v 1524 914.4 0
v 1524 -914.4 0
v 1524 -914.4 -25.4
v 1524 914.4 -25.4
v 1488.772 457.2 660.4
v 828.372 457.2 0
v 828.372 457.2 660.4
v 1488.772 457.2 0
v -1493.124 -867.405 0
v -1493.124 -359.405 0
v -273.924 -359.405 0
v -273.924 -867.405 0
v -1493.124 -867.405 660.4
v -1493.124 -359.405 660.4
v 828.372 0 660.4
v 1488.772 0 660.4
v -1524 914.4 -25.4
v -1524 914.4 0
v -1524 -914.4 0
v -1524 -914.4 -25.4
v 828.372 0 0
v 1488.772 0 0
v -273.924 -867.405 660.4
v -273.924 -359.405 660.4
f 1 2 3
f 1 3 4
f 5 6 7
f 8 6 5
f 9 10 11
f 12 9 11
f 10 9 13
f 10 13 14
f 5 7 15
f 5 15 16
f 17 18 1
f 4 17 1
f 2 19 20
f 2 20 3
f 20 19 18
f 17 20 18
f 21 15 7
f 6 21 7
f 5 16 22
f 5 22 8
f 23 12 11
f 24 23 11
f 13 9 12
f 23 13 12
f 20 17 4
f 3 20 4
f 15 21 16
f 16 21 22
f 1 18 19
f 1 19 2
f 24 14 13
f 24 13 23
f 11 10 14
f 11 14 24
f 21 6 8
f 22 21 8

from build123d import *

# Parameters (mm, degrees)
F0_W     = 3048
F0_H     = 1828.8
F2_DEPTH = 25.4
F1_W     = 1219.2
F1_H     = 508
F1_W_2   = 660.4
F1_H_2   = 457.2
F3_DEPTH = 660.4


with BuildPart() as f2:
    # F0 (on Top) → F2 (new body)
    with BuildSketch(Plane.XY):
        Rectangle(F0_W, F0_H)
    extrude(amount=-F2_DEPTH)


with BuildPart() as f3:
    # F1 (on Top) → F3 (new body)
    with BuildSketch(Plane.XY):
        with Locations((-883.524127, -613.40464)):
            Rectangle(F1_W, F1_H)
        with Locations((1158.571823, 228.6)):
            Rectangle(F1_W_2, F1_H_2)
    extrude(amount=F3_DEPTH)


solid = Compound([f2.part, f3.part])
